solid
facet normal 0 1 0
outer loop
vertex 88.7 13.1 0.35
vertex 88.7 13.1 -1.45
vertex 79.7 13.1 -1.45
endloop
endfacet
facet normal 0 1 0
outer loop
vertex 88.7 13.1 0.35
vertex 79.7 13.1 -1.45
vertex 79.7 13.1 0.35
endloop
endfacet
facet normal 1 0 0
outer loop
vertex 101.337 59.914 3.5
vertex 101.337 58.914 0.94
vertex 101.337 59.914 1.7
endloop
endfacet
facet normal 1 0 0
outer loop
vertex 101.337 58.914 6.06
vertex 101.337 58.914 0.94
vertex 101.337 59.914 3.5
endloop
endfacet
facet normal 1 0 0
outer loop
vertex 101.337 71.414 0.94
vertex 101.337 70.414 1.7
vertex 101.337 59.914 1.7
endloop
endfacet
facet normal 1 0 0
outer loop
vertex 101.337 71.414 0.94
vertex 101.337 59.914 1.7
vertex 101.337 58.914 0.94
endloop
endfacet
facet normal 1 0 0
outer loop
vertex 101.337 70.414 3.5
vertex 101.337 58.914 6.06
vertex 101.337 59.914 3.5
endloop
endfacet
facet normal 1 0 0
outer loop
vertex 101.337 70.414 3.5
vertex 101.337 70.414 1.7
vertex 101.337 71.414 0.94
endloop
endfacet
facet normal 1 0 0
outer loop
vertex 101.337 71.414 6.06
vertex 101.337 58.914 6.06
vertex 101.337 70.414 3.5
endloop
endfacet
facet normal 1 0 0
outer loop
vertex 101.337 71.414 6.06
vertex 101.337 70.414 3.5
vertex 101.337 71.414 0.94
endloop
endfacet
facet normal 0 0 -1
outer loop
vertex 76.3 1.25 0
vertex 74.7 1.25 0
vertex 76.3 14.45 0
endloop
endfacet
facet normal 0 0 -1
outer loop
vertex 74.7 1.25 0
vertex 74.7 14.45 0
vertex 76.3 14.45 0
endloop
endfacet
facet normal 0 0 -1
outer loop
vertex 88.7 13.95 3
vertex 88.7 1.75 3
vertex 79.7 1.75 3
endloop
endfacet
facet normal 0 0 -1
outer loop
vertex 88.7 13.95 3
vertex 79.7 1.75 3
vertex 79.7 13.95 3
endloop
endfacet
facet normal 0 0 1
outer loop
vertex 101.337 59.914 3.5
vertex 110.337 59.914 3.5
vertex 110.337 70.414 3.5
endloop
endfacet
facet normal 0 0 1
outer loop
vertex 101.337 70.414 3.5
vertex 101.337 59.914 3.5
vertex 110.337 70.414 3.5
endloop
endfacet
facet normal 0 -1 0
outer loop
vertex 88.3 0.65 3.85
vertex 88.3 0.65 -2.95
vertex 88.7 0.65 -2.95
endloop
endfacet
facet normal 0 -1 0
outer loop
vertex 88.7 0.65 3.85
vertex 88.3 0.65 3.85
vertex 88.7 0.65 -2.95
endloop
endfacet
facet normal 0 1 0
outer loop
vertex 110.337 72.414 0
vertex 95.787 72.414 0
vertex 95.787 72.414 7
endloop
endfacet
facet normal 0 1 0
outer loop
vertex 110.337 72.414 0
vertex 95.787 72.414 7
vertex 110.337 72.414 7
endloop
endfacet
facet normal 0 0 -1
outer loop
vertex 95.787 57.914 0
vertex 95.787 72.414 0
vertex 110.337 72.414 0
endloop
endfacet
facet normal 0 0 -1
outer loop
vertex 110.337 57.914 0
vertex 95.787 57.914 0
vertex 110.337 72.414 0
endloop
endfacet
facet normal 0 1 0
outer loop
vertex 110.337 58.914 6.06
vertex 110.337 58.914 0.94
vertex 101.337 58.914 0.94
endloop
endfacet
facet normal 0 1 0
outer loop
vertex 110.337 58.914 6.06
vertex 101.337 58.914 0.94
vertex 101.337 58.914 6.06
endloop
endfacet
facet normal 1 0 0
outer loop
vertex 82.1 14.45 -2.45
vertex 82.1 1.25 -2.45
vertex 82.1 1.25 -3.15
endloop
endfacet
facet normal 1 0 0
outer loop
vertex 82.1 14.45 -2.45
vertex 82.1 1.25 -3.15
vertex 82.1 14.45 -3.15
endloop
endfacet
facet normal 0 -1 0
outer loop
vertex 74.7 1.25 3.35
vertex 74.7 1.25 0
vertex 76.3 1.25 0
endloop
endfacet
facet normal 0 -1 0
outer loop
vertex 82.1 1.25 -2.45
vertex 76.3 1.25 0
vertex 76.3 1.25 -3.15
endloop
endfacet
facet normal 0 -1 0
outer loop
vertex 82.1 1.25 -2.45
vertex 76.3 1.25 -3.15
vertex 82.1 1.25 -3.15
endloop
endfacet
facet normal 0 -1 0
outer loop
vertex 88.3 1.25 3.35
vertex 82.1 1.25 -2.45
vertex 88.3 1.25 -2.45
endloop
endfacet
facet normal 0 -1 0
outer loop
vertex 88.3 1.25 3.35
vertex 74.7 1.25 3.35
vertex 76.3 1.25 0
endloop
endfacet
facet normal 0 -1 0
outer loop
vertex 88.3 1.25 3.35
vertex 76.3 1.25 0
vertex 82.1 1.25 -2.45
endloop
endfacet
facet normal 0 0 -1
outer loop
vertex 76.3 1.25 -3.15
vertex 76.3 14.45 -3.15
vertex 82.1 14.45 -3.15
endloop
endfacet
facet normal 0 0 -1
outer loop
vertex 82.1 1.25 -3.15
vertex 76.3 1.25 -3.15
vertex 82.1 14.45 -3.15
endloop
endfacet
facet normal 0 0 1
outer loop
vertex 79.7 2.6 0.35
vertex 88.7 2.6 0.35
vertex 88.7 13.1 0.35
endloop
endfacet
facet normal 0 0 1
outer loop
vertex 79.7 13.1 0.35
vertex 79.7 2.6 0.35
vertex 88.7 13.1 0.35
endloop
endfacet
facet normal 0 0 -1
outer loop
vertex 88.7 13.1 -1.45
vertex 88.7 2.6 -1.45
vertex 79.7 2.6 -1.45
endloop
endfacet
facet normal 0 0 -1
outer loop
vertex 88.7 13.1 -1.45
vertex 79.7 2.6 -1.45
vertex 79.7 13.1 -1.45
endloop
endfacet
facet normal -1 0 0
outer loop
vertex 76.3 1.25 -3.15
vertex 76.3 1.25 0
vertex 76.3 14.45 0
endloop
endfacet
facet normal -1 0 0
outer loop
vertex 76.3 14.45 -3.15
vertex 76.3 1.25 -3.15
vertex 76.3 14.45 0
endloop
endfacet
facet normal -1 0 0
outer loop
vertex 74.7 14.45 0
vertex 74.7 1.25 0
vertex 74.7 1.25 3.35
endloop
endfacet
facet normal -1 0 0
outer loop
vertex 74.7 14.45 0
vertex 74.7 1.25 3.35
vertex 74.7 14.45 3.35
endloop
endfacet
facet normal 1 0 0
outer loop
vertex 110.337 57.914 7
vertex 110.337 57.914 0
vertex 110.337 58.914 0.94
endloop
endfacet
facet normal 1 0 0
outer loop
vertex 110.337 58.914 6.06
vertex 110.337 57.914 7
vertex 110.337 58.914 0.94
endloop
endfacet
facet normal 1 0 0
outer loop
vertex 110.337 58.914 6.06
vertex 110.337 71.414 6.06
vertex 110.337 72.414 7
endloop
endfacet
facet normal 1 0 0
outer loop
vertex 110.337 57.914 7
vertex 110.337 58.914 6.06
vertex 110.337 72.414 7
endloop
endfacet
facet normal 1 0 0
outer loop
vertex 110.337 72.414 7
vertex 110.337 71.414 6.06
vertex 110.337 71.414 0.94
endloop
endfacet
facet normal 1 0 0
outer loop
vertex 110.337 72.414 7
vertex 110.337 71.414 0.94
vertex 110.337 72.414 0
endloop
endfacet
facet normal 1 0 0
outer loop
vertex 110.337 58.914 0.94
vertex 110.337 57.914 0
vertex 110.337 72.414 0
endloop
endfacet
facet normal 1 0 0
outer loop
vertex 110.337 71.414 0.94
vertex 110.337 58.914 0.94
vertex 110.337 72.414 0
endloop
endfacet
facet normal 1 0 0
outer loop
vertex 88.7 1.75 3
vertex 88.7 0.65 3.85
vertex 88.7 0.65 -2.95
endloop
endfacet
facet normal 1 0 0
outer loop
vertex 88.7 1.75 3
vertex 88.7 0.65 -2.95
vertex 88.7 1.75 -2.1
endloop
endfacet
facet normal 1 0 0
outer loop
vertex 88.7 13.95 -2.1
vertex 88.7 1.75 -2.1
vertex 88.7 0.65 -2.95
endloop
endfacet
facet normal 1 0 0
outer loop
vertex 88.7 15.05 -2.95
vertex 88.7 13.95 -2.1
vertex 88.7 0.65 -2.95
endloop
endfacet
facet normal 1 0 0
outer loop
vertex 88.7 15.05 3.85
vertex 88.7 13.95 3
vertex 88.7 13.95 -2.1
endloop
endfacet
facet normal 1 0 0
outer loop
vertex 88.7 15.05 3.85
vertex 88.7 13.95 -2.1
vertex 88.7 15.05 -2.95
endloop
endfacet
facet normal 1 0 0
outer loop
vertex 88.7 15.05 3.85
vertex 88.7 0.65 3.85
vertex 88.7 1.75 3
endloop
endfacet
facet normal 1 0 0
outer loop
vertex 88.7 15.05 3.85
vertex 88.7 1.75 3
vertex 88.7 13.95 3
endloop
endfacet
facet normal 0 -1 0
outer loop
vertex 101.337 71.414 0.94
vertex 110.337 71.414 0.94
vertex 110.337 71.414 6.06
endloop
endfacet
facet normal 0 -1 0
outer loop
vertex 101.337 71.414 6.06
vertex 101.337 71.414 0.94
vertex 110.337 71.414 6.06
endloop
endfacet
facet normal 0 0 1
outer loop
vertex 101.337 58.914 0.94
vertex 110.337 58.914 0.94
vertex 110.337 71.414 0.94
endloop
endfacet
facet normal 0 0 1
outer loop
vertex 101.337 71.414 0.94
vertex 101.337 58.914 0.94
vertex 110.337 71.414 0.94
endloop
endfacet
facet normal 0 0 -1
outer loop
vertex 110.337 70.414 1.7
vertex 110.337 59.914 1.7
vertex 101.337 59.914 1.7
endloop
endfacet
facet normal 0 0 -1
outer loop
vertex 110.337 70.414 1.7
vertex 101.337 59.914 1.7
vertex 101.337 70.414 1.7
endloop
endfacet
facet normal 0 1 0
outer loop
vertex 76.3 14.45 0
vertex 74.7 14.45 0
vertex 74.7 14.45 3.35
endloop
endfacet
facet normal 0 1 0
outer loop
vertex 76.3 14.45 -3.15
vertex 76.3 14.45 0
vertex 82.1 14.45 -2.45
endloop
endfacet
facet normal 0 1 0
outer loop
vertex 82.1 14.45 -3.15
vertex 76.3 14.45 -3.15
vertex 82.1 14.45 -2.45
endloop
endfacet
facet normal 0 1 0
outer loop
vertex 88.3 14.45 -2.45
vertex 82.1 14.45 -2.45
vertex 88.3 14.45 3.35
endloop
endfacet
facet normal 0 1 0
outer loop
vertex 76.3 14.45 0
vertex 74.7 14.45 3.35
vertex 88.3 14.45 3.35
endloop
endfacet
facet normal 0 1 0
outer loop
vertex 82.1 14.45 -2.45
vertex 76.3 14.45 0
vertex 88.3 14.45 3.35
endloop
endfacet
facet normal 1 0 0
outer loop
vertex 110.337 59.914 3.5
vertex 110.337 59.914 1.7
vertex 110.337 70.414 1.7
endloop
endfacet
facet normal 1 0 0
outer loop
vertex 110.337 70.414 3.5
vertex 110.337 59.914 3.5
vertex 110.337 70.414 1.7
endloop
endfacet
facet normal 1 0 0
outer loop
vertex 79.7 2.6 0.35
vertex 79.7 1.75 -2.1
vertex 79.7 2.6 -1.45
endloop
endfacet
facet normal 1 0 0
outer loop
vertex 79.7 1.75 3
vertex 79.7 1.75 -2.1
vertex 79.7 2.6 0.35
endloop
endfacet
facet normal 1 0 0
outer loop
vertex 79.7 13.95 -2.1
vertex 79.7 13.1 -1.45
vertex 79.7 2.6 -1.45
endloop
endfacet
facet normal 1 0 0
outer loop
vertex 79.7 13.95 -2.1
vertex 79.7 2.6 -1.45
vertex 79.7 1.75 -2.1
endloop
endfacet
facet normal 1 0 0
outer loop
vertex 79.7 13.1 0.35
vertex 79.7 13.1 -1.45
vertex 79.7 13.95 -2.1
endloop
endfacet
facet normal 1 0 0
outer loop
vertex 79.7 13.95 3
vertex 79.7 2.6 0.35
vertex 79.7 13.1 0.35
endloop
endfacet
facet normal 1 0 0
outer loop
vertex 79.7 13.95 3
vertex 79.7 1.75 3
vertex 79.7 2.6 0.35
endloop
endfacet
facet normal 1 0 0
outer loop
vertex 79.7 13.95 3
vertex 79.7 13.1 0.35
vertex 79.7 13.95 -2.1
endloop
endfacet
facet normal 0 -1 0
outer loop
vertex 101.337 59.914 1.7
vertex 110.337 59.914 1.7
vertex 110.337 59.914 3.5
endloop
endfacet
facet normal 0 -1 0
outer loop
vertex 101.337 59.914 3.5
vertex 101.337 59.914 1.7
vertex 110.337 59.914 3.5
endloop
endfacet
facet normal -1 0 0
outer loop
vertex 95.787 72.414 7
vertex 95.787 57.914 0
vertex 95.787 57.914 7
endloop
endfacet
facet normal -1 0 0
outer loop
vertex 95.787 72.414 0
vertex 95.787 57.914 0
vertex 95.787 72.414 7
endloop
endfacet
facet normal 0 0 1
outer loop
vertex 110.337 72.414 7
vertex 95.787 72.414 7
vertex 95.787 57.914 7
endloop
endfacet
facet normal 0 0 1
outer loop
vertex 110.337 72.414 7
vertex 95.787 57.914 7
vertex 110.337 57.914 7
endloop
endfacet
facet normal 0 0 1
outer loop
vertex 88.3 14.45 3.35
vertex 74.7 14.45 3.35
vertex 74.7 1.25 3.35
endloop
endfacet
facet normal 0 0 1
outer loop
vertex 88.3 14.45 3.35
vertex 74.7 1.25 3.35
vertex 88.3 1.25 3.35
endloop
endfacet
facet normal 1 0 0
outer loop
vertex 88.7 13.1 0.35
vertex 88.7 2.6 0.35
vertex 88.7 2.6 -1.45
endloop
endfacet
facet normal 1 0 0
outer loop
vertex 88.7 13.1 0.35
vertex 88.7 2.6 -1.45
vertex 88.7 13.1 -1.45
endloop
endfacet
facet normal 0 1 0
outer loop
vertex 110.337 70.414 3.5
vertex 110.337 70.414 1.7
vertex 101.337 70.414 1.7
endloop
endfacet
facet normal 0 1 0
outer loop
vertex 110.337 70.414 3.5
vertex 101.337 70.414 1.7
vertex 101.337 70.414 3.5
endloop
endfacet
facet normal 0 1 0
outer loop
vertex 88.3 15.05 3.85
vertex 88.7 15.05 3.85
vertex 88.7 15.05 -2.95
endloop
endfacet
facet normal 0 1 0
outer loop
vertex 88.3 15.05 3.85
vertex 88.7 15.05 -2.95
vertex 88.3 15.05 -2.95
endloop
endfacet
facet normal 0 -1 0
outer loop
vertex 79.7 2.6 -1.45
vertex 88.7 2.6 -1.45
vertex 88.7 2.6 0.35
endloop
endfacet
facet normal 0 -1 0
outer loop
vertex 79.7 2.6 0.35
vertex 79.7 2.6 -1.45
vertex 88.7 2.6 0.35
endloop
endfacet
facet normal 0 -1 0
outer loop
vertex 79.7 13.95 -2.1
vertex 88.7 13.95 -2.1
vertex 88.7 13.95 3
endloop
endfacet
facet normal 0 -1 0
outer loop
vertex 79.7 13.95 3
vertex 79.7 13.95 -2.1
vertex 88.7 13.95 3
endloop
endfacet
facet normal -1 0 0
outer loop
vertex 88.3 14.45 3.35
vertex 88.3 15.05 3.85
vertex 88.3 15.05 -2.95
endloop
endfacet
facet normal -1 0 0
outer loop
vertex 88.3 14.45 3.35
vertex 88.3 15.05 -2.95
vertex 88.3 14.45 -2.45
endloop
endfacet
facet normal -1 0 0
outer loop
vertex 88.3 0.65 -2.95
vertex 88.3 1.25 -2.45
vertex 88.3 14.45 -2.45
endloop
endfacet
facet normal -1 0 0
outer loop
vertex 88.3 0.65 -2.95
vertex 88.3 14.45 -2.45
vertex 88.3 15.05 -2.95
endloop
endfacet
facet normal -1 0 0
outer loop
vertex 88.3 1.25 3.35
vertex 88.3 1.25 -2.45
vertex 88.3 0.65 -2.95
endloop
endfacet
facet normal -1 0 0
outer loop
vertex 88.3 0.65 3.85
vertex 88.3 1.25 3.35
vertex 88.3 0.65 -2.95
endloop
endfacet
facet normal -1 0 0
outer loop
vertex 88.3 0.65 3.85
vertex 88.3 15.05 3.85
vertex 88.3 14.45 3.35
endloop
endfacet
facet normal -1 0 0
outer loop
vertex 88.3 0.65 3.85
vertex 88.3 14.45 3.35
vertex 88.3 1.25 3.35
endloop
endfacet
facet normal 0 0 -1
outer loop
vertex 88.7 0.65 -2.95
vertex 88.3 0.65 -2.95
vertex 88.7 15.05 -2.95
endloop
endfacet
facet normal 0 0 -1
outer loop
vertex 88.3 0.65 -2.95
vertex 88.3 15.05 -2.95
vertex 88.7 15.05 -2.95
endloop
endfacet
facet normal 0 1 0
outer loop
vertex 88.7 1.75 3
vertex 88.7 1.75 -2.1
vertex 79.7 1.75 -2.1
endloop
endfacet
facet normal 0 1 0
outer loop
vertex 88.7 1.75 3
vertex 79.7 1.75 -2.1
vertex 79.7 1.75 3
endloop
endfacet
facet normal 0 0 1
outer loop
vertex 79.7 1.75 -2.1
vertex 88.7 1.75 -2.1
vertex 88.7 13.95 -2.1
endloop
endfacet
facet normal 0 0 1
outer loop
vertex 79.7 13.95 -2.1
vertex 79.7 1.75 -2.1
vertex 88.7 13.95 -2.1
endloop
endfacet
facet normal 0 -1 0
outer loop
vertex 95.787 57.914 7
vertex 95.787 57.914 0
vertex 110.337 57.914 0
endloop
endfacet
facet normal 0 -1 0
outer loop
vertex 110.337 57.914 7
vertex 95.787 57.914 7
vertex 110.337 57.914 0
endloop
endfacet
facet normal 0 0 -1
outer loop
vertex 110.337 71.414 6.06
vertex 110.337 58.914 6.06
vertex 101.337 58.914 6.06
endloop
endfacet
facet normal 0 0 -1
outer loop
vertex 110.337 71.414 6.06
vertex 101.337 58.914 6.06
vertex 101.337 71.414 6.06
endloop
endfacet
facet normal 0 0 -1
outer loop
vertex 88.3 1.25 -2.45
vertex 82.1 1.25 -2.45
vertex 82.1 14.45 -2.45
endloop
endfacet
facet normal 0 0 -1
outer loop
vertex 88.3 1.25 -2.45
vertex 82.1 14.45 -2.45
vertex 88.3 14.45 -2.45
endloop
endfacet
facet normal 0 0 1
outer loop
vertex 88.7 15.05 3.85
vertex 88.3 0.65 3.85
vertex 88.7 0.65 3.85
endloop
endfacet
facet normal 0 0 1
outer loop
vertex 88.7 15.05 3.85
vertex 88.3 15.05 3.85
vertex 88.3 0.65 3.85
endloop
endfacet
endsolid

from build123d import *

# Parameters (mm, degrees)
F1_W          = 6.2
F1_H          = 13.2
F1_W_2        = 5.8
F1_W_3        = 1.6
F2_DEPTH      = 3.35
F3_DEPTH      = 3.15
F4_DEPTH      = 2.45
F5_DEPTH      = 3.85
F5_DEPTH_BACK = 2.95
F6_W          = 12.2
F6_H          = 5.1
F6_W_2        = 10.5
F6_H_2        = 1.8
F7_DEPTH      = 9
F8_W          = 14.55
F8_H          = 14.5
F9_DEPTH      = 7
F10_W         = 12.5
F10_H         = 5.12
F10_W_2       = 10.5
F10_H_2       = 1.8
F11_DEPTH     = 9


with BuildPart() as f2:
    # F1 (on Top) → F2 (new body)
    with BuildSketch(Plane.XY):
        with Locations((85.2, 7.85)):
            Rectangle(F1_W, F1_H)
        with Locations((79.2, 7.85)):
            Rectangle(F1_W_2, F1_H)
        with Locations((75.5, 7.85)):
            Rectangle(F1_W_3, F1_H)
    extrude(amount=F2_DEPTH)

    # F1 (on Top) → F3 (join)
    with BuildSketch(Plane.XY):
        with Locations((79.2, 7.85)):
            Rectangle(F1_W_2, F1_H)
    extrude(amount=-F3_DEPTH)

    # F1 (on Top) → F4 (join)
    with BuildSketch(Plane.XY):
        with Locations((85.2, 7.85)):
            Rectangle(F1_W, F1_H)
    extrude(amount=-F4_DEPTH)

    # F1 (on Top) → F5 (join, two sides)
    with BuildSketch(Plane.XY) as f5_sk:
        Polygon((88.3, 14.45), (88.3, 1.25), (88.3, 0.65), (88.7, 0.65), (88.7, 15.05), (88.3, 15.05), align=None)
    extrude(amount=F5_DEPTH)
    extrude(f5_sk.sketch, amount=-F5_DEPTH_BACK)

    # F6 (on face) → F7 (cut)
    with BuildSketch(Plane.YZ.offset(88.7)):
        with Locations((7.85, 0.45)):
            Rectangle(F6_W, F6_H)
        with Locations((7.85, -0.55)):
            Rectangle(F6_W_2, F6_H_2, mode=Mode.SUBTRACT)
    extrude(amount=-F7_DEPTH, mode=Mode.SUBTRACT)


with BuildPart() as f9:
    # F8 (on Top) → F9 (new body)
    with BuildSketch(Plane.XY):
        with Locations((103.062142683, 65.1640551686)):
            Rectangle(F8_W, F8_H)
    extrude(amount=F9_DEPTH)

    # F10 (on face) → F11 (cut)
    with BuildSketch(Plane.YZ.offset(110.337142683)):
        with Locations((65.1640551686, 3.5)):
            Rectangle(F10_W, F10_H)
        with Locations((65.1640551686, 2.6)):
            Rectangle(F10_W_2, F10_H_2, mode=Mode.SUBTRACT)
    extrude(amount=-F11_DEPTH, mode=Mode.SUBTRACT)


solid = Compound([f2.part, f9.part])
